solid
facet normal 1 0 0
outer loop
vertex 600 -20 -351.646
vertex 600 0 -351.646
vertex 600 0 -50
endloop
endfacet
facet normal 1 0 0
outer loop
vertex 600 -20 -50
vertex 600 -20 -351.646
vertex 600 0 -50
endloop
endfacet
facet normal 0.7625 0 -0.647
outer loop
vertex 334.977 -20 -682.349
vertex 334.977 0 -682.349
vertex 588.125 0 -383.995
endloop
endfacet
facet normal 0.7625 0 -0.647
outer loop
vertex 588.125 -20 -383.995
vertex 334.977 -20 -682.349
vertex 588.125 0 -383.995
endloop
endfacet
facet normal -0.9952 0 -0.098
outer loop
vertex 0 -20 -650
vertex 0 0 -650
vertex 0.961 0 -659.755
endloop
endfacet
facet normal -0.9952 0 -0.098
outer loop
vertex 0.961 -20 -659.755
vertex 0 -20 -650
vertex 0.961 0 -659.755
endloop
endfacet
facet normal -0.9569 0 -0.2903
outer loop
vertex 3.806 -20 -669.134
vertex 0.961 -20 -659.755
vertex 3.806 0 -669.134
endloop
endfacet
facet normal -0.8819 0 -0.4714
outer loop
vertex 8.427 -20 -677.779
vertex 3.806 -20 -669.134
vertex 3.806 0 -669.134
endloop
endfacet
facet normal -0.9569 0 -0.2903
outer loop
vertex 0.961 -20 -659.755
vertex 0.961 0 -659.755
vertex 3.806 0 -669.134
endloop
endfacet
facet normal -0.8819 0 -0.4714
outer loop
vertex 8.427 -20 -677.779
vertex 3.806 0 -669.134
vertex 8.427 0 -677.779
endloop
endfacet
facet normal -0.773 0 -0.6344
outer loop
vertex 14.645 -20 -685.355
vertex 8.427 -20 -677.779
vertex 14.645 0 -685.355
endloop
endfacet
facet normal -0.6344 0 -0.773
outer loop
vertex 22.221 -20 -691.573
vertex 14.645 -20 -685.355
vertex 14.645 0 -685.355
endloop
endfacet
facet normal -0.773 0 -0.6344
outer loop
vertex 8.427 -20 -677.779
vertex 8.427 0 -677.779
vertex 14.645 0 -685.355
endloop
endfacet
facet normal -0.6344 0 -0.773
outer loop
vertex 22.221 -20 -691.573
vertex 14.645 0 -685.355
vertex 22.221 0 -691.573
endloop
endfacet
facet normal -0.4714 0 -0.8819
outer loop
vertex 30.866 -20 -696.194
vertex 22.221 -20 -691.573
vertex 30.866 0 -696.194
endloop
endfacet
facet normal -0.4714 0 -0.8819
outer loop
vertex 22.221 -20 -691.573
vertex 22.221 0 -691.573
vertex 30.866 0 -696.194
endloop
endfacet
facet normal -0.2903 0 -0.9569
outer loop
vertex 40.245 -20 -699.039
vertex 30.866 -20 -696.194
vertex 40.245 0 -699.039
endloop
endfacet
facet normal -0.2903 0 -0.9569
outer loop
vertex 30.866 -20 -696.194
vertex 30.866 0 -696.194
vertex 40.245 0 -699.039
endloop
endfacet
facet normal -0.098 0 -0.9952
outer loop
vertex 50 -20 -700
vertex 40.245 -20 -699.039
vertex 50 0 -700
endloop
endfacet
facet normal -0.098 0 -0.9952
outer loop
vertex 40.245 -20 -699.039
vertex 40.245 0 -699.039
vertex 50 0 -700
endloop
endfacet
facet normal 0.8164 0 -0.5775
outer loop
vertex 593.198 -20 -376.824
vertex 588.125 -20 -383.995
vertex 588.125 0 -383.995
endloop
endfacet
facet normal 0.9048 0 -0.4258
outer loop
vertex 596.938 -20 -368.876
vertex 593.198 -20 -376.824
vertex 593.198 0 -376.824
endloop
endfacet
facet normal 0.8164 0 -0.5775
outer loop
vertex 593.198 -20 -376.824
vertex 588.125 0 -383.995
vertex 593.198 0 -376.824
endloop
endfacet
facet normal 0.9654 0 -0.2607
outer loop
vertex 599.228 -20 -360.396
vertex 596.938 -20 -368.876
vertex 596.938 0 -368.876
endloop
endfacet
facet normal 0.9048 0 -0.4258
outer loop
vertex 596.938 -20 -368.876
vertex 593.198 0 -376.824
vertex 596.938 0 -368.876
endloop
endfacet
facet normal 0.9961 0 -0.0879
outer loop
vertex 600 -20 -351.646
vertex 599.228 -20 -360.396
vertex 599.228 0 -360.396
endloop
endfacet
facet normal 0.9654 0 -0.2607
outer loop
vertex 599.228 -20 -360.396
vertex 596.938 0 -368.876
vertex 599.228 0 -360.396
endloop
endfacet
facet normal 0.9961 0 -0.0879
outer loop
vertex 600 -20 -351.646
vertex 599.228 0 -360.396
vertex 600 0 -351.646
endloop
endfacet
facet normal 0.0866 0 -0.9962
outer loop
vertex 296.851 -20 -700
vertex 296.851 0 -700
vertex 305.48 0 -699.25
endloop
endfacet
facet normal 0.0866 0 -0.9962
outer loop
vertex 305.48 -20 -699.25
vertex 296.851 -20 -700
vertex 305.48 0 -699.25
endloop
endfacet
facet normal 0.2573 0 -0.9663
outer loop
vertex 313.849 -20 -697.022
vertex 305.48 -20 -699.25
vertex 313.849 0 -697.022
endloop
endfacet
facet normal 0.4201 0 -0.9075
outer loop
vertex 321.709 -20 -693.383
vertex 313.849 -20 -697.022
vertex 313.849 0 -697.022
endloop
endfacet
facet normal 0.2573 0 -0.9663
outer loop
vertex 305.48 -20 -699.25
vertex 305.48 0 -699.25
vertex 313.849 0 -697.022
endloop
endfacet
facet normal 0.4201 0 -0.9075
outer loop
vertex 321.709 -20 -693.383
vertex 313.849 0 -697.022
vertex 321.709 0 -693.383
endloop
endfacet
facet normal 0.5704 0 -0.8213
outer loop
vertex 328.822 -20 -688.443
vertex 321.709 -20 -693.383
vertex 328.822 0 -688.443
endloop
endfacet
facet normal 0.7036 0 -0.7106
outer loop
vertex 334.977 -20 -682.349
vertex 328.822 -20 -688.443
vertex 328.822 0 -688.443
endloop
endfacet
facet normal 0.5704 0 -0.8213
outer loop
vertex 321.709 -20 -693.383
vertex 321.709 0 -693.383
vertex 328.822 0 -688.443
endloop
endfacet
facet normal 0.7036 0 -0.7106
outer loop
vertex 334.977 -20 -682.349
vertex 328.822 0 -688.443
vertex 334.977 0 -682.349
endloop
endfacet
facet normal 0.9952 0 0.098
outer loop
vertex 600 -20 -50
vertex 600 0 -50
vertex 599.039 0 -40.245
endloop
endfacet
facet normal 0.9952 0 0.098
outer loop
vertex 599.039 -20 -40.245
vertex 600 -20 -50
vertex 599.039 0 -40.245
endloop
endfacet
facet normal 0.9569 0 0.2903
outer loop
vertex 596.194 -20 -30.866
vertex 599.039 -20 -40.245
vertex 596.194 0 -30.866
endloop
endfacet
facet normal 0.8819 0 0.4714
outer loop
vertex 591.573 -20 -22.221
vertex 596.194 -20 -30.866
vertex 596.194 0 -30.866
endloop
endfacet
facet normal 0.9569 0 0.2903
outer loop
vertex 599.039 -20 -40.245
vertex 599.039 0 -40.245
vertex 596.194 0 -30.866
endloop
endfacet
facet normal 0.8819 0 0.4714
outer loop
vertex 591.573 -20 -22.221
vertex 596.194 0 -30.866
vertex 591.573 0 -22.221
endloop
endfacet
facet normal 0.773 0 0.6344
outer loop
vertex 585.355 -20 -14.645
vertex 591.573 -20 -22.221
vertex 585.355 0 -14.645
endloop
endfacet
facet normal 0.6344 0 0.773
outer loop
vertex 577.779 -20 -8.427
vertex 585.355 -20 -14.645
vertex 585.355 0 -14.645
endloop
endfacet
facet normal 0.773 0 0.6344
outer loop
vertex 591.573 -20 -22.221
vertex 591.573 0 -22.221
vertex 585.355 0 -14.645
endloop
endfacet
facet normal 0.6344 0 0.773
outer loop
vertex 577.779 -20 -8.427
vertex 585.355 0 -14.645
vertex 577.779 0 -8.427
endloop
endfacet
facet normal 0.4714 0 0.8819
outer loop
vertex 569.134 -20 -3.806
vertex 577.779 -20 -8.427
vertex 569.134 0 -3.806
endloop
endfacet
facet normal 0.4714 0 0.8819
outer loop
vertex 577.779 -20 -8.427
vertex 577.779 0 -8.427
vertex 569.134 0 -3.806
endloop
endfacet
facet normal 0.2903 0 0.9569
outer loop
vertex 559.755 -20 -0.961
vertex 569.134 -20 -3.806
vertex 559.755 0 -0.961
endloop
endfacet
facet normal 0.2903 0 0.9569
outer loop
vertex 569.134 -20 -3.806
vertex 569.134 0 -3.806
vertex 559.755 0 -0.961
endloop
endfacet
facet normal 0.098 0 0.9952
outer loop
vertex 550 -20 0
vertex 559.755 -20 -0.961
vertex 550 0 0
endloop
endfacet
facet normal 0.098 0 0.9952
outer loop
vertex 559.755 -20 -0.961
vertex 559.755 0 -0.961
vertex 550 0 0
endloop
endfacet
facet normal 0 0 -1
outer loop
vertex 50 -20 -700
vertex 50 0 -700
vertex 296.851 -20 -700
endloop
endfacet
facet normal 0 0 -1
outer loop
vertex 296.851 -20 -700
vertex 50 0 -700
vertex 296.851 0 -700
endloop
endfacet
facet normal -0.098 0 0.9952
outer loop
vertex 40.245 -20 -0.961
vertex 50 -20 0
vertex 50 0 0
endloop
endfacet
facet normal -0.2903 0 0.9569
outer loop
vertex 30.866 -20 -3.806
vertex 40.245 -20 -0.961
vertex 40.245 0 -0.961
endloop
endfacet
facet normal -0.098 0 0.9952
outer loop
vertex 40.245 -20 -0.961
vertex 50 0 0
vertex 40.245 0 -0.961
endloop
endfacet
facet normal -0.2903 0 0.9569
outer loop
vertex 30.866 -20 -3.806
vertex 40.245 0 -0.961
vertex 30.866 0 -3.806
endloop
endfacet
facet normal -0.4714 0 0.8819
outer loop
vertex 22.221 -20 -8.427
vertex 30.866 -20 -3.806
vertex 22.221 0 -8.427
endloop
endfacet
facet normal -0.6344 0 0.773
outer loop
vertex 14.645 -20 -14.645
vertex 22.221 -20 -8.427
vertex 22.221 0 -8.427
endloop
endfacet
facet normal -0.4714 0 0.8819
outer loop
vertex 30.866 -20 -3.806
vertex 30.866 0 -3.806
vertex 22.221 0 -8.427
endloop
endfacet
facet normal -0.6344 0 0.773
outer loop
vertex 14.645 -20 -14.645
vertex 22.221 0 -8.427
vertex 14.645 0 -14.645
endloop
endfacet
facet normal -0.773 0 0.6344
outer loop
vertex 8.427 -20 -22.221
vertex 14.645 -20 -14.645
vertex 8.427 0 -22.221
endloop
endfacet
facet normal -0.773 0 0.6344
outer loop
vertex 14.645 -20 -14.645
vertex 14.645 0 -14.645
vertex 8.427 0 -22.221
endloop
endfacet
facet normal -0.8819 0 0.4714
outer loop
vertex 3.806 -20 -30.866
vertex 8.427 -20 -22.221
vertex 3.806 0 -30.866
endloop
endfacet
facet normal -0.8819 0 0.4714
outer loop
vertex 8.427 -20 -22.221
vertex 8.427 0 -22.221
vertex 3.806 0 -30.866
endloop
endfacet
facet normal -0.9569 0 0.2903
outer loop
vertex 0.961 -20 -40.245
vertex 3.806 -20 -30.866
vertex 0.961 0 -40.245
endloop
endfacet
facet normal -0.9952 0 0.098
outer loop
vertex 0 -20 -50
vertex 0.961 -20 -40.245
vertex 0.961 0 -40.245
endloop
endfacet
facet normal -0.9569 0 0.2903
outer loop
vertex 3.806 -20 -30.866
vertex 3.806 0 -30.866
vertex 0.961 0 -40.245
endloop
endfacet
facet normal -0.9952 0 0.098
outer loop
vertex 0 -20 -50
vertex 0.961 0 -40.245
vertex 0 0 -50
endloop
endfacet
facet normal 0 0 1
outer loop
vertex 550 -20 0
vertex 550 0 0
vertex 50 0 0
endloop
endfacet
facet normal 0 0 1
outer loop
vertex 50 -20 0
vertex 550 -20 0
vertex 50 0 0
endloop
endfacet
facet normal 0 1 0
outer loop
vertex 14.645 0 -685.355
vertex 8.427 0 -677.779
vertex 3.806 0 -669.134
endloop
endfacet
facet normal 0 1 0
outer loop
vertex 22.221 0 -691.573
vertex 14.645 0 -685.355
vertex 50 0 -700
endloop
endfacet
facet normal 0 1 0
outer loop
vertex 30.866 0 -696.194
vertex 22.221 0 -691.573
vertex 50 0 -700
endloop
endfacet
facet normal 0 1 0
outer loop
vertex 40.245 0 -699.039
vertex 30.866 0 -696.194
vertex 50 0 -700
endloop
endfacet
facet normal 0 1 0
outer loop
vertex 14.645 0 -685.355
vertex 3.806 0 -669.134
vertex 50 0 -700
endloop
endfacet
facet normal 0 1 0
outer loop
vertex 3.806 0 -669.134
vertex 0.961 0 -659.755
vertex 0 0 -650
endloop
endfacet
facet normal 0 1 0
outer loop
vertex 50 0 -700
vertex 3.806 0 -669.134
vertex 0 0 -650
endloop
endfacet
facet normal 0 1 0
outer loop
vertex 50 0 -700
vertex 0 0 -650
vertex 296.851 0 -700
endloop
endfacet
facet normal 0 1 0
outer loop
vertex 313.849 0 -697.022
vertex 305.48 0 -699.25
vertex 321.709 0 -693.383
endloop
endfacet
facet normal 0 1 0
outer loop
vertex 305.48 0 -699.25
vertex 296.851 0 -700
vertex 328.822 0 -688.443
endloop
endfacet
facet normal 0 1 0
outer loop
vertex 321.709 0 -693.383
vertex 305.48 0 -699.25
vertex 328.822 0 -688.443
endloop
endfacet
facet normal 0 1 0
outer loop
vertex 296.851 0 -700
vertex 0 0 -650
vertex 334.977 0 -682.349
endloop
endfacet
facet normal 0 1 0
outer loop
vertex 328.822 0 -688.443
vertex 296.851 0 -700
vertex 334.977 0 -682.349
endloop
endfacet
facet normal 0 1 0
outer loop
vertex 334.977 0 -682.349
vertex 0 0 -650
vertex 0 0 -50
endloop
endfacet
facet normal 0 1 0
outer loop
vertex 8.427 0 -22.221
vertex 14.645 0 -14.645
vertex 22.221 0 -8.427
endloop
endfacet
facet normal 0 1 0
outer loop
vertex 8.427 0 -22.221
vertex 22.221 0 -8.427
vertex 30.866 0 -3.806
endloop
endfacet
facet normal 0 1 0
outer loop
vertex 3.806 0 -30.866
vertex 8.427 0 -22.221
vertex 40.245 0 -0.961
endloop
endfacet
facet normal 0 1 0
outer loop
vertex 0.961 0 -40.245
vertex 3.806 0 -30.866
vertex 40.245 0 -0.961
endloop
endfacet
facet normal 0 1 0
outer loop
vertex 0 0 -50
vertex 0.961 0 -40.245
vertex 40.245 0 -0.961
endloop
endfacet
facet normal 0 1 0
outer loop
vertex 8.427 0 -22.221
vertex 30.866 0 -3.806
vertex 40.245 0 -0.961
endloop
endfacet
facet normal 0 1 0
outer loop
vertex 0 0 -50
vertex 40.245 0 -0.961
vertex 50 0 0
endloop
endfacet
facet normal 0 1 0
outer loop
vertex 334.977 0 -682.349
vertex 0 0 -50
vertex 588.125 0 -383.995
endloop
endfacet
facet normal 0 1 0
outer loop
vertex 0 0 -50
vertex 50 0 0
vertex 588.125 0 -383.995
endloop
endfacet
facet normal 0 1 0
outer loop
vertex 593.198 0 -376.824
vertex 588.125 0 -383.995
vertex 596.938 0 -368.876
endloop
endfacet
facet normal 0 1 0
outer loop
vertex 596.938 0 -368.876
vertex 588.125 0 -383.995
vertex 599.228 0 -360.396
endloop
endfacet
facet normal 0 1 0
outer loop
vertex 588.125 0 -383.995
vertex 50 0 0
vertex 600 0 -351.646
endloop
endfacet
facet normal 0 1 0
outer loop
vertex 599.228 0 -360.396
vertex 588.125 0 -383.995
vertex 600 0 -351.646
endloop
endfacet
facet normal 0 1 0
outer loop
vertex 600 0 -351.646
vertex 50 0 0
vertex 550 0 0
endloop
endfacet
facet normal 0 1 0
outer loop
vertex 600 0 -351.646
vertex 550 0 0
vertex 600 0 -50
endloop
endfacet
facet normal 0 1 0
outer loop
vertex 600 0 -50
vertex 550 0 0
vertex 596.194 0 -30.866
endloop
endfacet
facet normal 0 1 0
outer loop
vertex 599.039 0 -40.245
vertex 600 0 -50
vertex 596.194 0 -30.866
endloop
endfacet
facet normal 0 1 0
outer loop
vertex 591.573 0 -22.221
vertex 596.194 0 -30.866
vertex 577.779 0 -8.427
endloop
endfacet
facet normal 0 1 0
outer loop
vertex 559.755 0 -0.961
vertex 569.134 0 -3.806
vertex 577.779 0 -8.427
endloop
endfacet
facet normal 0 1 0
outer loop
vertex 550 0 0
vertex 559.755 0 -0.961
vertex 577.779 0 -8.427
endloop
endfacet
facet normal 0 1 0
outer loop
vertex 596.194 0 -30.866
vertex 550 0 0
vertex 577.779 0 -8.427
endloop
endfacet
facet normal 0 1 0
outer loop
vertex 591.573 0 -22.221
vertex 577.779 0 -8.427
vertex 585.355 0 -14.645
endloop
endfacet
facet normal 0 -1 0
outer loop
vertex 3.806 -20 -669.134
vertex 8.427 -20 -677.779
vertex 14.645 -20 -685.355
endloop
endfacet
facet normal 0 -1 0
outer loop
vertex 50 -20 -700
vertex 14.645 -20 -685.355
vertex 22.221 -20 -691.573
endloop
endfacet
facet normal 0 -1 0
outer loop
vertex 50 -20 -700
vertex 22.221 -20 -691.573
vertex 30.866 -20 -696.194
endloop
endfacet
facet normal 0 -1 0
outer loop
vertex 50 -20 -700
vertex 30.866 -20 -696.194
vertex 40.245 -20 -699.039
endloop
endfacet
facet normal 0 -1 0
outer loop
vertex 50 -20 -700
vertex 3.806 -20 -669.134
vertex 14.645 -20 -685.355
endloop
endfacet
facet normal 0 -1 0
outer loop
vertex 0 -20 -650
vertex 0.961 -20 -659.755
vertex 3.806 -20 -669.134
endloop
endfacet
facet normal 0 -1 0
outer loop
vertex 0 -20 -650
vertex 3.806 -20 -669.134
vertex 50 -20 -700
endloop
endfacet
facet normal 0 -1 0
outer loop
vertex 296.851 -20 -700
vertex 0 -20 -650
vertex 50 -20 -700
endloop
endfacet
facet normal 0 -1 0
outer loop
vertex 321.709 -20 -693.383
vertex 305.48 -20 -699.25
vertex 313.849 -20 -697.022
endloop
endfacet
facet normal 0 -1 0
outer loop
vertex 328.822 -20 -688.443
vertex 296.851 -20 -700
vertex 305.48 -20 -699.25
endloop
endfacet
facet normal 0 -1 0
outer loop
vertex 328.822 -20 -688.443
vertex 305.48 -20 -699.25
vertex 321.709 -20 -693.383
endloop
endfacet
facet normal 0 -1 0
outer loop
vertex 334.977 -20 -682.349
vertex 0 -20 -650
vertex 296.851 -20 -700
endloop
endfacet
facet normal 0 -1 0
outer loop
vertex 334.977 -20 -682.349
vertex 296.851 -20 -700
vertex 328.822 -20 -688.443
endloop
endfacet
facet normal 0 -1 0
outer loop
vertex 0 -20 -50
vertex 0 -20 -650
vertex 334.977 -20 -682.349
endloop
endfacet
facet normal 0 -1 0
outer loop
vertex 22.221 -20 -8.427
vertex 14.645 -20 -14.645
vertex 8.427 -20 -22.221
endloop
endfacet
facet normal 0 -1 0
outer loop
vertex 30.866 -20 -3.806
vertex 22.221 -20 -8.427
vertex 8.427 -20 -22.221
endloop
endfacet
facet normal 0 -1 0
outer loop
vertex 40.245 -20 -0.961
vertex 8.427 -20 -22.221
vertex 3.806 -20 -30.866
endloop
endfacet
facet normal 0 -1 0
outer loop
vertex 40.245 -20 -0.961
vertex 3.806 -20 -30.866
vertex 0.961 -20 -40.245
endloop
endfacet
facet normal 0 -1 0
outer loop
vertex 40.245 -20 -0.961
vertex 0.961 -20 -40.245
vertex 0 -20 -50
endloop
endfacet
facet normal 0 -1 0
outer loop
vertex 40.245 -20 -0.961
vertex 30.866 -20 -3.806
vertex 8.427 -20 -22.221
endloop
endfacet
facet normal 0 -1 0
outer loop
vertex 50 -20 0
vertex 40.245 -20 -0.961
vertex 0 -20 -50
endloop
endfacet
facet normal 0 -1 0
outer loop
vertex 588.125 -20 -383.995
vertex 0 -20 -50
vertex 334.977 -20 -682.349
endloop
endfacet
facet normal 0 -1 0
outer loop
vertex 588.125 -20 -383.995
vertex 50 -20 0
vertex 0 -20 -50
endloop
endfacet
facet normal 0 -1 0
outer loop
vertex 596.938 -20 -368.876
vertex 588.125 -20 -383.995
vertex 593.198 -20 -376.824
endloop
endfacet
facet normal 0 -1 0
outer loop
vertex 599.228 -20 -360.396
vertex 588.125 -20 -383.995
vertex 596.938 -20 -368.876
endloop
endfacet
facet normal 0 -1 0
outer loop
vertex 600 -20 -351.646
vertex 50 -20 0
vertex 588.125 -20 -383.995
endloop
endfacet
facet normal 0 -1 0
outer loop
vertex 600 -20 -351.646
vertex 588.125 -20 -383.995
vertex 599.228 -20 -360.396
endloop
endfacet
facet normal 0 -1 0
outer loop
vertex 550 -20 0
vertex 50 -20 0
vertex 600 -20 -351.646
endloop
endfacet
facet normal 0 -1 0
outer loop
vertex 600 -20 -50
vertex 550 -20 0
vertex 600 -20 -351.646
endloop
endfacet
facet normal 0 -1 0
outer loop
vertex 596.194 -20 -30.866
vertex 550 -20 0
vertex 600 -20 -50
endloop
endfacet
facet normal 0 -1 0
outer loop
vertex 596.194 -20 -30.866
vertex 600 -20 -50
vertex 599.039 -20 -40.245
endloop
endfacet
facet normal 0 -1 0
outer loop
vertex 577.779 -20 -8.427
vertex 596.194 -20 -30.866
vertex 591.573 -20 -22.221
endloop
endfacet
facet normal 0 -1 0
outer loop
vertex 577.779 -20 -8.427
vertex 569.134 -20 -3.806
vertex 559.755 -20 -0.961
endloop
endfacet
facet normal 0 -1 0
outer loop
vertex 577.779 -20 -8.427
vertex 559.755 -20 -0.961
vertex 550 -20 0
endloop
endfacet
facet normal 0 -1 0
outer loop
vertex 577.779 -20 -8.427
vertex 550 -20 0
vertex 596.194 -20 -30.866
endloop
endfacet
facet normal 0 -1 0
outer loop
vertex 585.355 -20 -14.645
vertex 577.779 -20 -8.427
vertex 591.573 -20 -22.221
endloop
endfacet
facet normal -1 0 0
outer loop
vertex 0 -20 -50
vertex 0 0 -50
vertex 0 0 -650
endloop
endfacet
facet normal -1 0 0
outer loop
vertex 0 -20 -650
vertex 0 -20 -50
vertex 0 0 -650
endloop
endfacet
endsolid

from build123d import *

# Parameters (mm, degrees)
F1_DEPTH = 20


with BuildPart() as f1:
    # F0 (on Front) → F1 (new body)
    with BuildSketch(Plane.XZ):
        with BuildLine():
            Line((550, 0), (50, 0))
            ThreePointArc((50, 0), (14.644661, -14.644661), (0, -50))
            Line((0, -50), (0, -650))
            ThreePointArc((0, -650), (14.644661, -685.355339), (50, -700))
            Line((50, -700), (296.851258, -700))
            ThreePointArc((296.851258, -700), (317.85788, -695.37314), (334.976714, -682.348872))
            Line((334.976714, -682.348872), (588.125457, -383.994997))
            ThreePointArc((588.125457, -383.994997), (596.93758, -368.875855), (600, -351.646125))
            Line((600, -351.646125), (600, -50))
            ThreePointArc((600, -50), (585.355339, -14.644661), (550, 0))
        make_face()
    extrude(amount=F1_DEPTH)


solid = f1.part
